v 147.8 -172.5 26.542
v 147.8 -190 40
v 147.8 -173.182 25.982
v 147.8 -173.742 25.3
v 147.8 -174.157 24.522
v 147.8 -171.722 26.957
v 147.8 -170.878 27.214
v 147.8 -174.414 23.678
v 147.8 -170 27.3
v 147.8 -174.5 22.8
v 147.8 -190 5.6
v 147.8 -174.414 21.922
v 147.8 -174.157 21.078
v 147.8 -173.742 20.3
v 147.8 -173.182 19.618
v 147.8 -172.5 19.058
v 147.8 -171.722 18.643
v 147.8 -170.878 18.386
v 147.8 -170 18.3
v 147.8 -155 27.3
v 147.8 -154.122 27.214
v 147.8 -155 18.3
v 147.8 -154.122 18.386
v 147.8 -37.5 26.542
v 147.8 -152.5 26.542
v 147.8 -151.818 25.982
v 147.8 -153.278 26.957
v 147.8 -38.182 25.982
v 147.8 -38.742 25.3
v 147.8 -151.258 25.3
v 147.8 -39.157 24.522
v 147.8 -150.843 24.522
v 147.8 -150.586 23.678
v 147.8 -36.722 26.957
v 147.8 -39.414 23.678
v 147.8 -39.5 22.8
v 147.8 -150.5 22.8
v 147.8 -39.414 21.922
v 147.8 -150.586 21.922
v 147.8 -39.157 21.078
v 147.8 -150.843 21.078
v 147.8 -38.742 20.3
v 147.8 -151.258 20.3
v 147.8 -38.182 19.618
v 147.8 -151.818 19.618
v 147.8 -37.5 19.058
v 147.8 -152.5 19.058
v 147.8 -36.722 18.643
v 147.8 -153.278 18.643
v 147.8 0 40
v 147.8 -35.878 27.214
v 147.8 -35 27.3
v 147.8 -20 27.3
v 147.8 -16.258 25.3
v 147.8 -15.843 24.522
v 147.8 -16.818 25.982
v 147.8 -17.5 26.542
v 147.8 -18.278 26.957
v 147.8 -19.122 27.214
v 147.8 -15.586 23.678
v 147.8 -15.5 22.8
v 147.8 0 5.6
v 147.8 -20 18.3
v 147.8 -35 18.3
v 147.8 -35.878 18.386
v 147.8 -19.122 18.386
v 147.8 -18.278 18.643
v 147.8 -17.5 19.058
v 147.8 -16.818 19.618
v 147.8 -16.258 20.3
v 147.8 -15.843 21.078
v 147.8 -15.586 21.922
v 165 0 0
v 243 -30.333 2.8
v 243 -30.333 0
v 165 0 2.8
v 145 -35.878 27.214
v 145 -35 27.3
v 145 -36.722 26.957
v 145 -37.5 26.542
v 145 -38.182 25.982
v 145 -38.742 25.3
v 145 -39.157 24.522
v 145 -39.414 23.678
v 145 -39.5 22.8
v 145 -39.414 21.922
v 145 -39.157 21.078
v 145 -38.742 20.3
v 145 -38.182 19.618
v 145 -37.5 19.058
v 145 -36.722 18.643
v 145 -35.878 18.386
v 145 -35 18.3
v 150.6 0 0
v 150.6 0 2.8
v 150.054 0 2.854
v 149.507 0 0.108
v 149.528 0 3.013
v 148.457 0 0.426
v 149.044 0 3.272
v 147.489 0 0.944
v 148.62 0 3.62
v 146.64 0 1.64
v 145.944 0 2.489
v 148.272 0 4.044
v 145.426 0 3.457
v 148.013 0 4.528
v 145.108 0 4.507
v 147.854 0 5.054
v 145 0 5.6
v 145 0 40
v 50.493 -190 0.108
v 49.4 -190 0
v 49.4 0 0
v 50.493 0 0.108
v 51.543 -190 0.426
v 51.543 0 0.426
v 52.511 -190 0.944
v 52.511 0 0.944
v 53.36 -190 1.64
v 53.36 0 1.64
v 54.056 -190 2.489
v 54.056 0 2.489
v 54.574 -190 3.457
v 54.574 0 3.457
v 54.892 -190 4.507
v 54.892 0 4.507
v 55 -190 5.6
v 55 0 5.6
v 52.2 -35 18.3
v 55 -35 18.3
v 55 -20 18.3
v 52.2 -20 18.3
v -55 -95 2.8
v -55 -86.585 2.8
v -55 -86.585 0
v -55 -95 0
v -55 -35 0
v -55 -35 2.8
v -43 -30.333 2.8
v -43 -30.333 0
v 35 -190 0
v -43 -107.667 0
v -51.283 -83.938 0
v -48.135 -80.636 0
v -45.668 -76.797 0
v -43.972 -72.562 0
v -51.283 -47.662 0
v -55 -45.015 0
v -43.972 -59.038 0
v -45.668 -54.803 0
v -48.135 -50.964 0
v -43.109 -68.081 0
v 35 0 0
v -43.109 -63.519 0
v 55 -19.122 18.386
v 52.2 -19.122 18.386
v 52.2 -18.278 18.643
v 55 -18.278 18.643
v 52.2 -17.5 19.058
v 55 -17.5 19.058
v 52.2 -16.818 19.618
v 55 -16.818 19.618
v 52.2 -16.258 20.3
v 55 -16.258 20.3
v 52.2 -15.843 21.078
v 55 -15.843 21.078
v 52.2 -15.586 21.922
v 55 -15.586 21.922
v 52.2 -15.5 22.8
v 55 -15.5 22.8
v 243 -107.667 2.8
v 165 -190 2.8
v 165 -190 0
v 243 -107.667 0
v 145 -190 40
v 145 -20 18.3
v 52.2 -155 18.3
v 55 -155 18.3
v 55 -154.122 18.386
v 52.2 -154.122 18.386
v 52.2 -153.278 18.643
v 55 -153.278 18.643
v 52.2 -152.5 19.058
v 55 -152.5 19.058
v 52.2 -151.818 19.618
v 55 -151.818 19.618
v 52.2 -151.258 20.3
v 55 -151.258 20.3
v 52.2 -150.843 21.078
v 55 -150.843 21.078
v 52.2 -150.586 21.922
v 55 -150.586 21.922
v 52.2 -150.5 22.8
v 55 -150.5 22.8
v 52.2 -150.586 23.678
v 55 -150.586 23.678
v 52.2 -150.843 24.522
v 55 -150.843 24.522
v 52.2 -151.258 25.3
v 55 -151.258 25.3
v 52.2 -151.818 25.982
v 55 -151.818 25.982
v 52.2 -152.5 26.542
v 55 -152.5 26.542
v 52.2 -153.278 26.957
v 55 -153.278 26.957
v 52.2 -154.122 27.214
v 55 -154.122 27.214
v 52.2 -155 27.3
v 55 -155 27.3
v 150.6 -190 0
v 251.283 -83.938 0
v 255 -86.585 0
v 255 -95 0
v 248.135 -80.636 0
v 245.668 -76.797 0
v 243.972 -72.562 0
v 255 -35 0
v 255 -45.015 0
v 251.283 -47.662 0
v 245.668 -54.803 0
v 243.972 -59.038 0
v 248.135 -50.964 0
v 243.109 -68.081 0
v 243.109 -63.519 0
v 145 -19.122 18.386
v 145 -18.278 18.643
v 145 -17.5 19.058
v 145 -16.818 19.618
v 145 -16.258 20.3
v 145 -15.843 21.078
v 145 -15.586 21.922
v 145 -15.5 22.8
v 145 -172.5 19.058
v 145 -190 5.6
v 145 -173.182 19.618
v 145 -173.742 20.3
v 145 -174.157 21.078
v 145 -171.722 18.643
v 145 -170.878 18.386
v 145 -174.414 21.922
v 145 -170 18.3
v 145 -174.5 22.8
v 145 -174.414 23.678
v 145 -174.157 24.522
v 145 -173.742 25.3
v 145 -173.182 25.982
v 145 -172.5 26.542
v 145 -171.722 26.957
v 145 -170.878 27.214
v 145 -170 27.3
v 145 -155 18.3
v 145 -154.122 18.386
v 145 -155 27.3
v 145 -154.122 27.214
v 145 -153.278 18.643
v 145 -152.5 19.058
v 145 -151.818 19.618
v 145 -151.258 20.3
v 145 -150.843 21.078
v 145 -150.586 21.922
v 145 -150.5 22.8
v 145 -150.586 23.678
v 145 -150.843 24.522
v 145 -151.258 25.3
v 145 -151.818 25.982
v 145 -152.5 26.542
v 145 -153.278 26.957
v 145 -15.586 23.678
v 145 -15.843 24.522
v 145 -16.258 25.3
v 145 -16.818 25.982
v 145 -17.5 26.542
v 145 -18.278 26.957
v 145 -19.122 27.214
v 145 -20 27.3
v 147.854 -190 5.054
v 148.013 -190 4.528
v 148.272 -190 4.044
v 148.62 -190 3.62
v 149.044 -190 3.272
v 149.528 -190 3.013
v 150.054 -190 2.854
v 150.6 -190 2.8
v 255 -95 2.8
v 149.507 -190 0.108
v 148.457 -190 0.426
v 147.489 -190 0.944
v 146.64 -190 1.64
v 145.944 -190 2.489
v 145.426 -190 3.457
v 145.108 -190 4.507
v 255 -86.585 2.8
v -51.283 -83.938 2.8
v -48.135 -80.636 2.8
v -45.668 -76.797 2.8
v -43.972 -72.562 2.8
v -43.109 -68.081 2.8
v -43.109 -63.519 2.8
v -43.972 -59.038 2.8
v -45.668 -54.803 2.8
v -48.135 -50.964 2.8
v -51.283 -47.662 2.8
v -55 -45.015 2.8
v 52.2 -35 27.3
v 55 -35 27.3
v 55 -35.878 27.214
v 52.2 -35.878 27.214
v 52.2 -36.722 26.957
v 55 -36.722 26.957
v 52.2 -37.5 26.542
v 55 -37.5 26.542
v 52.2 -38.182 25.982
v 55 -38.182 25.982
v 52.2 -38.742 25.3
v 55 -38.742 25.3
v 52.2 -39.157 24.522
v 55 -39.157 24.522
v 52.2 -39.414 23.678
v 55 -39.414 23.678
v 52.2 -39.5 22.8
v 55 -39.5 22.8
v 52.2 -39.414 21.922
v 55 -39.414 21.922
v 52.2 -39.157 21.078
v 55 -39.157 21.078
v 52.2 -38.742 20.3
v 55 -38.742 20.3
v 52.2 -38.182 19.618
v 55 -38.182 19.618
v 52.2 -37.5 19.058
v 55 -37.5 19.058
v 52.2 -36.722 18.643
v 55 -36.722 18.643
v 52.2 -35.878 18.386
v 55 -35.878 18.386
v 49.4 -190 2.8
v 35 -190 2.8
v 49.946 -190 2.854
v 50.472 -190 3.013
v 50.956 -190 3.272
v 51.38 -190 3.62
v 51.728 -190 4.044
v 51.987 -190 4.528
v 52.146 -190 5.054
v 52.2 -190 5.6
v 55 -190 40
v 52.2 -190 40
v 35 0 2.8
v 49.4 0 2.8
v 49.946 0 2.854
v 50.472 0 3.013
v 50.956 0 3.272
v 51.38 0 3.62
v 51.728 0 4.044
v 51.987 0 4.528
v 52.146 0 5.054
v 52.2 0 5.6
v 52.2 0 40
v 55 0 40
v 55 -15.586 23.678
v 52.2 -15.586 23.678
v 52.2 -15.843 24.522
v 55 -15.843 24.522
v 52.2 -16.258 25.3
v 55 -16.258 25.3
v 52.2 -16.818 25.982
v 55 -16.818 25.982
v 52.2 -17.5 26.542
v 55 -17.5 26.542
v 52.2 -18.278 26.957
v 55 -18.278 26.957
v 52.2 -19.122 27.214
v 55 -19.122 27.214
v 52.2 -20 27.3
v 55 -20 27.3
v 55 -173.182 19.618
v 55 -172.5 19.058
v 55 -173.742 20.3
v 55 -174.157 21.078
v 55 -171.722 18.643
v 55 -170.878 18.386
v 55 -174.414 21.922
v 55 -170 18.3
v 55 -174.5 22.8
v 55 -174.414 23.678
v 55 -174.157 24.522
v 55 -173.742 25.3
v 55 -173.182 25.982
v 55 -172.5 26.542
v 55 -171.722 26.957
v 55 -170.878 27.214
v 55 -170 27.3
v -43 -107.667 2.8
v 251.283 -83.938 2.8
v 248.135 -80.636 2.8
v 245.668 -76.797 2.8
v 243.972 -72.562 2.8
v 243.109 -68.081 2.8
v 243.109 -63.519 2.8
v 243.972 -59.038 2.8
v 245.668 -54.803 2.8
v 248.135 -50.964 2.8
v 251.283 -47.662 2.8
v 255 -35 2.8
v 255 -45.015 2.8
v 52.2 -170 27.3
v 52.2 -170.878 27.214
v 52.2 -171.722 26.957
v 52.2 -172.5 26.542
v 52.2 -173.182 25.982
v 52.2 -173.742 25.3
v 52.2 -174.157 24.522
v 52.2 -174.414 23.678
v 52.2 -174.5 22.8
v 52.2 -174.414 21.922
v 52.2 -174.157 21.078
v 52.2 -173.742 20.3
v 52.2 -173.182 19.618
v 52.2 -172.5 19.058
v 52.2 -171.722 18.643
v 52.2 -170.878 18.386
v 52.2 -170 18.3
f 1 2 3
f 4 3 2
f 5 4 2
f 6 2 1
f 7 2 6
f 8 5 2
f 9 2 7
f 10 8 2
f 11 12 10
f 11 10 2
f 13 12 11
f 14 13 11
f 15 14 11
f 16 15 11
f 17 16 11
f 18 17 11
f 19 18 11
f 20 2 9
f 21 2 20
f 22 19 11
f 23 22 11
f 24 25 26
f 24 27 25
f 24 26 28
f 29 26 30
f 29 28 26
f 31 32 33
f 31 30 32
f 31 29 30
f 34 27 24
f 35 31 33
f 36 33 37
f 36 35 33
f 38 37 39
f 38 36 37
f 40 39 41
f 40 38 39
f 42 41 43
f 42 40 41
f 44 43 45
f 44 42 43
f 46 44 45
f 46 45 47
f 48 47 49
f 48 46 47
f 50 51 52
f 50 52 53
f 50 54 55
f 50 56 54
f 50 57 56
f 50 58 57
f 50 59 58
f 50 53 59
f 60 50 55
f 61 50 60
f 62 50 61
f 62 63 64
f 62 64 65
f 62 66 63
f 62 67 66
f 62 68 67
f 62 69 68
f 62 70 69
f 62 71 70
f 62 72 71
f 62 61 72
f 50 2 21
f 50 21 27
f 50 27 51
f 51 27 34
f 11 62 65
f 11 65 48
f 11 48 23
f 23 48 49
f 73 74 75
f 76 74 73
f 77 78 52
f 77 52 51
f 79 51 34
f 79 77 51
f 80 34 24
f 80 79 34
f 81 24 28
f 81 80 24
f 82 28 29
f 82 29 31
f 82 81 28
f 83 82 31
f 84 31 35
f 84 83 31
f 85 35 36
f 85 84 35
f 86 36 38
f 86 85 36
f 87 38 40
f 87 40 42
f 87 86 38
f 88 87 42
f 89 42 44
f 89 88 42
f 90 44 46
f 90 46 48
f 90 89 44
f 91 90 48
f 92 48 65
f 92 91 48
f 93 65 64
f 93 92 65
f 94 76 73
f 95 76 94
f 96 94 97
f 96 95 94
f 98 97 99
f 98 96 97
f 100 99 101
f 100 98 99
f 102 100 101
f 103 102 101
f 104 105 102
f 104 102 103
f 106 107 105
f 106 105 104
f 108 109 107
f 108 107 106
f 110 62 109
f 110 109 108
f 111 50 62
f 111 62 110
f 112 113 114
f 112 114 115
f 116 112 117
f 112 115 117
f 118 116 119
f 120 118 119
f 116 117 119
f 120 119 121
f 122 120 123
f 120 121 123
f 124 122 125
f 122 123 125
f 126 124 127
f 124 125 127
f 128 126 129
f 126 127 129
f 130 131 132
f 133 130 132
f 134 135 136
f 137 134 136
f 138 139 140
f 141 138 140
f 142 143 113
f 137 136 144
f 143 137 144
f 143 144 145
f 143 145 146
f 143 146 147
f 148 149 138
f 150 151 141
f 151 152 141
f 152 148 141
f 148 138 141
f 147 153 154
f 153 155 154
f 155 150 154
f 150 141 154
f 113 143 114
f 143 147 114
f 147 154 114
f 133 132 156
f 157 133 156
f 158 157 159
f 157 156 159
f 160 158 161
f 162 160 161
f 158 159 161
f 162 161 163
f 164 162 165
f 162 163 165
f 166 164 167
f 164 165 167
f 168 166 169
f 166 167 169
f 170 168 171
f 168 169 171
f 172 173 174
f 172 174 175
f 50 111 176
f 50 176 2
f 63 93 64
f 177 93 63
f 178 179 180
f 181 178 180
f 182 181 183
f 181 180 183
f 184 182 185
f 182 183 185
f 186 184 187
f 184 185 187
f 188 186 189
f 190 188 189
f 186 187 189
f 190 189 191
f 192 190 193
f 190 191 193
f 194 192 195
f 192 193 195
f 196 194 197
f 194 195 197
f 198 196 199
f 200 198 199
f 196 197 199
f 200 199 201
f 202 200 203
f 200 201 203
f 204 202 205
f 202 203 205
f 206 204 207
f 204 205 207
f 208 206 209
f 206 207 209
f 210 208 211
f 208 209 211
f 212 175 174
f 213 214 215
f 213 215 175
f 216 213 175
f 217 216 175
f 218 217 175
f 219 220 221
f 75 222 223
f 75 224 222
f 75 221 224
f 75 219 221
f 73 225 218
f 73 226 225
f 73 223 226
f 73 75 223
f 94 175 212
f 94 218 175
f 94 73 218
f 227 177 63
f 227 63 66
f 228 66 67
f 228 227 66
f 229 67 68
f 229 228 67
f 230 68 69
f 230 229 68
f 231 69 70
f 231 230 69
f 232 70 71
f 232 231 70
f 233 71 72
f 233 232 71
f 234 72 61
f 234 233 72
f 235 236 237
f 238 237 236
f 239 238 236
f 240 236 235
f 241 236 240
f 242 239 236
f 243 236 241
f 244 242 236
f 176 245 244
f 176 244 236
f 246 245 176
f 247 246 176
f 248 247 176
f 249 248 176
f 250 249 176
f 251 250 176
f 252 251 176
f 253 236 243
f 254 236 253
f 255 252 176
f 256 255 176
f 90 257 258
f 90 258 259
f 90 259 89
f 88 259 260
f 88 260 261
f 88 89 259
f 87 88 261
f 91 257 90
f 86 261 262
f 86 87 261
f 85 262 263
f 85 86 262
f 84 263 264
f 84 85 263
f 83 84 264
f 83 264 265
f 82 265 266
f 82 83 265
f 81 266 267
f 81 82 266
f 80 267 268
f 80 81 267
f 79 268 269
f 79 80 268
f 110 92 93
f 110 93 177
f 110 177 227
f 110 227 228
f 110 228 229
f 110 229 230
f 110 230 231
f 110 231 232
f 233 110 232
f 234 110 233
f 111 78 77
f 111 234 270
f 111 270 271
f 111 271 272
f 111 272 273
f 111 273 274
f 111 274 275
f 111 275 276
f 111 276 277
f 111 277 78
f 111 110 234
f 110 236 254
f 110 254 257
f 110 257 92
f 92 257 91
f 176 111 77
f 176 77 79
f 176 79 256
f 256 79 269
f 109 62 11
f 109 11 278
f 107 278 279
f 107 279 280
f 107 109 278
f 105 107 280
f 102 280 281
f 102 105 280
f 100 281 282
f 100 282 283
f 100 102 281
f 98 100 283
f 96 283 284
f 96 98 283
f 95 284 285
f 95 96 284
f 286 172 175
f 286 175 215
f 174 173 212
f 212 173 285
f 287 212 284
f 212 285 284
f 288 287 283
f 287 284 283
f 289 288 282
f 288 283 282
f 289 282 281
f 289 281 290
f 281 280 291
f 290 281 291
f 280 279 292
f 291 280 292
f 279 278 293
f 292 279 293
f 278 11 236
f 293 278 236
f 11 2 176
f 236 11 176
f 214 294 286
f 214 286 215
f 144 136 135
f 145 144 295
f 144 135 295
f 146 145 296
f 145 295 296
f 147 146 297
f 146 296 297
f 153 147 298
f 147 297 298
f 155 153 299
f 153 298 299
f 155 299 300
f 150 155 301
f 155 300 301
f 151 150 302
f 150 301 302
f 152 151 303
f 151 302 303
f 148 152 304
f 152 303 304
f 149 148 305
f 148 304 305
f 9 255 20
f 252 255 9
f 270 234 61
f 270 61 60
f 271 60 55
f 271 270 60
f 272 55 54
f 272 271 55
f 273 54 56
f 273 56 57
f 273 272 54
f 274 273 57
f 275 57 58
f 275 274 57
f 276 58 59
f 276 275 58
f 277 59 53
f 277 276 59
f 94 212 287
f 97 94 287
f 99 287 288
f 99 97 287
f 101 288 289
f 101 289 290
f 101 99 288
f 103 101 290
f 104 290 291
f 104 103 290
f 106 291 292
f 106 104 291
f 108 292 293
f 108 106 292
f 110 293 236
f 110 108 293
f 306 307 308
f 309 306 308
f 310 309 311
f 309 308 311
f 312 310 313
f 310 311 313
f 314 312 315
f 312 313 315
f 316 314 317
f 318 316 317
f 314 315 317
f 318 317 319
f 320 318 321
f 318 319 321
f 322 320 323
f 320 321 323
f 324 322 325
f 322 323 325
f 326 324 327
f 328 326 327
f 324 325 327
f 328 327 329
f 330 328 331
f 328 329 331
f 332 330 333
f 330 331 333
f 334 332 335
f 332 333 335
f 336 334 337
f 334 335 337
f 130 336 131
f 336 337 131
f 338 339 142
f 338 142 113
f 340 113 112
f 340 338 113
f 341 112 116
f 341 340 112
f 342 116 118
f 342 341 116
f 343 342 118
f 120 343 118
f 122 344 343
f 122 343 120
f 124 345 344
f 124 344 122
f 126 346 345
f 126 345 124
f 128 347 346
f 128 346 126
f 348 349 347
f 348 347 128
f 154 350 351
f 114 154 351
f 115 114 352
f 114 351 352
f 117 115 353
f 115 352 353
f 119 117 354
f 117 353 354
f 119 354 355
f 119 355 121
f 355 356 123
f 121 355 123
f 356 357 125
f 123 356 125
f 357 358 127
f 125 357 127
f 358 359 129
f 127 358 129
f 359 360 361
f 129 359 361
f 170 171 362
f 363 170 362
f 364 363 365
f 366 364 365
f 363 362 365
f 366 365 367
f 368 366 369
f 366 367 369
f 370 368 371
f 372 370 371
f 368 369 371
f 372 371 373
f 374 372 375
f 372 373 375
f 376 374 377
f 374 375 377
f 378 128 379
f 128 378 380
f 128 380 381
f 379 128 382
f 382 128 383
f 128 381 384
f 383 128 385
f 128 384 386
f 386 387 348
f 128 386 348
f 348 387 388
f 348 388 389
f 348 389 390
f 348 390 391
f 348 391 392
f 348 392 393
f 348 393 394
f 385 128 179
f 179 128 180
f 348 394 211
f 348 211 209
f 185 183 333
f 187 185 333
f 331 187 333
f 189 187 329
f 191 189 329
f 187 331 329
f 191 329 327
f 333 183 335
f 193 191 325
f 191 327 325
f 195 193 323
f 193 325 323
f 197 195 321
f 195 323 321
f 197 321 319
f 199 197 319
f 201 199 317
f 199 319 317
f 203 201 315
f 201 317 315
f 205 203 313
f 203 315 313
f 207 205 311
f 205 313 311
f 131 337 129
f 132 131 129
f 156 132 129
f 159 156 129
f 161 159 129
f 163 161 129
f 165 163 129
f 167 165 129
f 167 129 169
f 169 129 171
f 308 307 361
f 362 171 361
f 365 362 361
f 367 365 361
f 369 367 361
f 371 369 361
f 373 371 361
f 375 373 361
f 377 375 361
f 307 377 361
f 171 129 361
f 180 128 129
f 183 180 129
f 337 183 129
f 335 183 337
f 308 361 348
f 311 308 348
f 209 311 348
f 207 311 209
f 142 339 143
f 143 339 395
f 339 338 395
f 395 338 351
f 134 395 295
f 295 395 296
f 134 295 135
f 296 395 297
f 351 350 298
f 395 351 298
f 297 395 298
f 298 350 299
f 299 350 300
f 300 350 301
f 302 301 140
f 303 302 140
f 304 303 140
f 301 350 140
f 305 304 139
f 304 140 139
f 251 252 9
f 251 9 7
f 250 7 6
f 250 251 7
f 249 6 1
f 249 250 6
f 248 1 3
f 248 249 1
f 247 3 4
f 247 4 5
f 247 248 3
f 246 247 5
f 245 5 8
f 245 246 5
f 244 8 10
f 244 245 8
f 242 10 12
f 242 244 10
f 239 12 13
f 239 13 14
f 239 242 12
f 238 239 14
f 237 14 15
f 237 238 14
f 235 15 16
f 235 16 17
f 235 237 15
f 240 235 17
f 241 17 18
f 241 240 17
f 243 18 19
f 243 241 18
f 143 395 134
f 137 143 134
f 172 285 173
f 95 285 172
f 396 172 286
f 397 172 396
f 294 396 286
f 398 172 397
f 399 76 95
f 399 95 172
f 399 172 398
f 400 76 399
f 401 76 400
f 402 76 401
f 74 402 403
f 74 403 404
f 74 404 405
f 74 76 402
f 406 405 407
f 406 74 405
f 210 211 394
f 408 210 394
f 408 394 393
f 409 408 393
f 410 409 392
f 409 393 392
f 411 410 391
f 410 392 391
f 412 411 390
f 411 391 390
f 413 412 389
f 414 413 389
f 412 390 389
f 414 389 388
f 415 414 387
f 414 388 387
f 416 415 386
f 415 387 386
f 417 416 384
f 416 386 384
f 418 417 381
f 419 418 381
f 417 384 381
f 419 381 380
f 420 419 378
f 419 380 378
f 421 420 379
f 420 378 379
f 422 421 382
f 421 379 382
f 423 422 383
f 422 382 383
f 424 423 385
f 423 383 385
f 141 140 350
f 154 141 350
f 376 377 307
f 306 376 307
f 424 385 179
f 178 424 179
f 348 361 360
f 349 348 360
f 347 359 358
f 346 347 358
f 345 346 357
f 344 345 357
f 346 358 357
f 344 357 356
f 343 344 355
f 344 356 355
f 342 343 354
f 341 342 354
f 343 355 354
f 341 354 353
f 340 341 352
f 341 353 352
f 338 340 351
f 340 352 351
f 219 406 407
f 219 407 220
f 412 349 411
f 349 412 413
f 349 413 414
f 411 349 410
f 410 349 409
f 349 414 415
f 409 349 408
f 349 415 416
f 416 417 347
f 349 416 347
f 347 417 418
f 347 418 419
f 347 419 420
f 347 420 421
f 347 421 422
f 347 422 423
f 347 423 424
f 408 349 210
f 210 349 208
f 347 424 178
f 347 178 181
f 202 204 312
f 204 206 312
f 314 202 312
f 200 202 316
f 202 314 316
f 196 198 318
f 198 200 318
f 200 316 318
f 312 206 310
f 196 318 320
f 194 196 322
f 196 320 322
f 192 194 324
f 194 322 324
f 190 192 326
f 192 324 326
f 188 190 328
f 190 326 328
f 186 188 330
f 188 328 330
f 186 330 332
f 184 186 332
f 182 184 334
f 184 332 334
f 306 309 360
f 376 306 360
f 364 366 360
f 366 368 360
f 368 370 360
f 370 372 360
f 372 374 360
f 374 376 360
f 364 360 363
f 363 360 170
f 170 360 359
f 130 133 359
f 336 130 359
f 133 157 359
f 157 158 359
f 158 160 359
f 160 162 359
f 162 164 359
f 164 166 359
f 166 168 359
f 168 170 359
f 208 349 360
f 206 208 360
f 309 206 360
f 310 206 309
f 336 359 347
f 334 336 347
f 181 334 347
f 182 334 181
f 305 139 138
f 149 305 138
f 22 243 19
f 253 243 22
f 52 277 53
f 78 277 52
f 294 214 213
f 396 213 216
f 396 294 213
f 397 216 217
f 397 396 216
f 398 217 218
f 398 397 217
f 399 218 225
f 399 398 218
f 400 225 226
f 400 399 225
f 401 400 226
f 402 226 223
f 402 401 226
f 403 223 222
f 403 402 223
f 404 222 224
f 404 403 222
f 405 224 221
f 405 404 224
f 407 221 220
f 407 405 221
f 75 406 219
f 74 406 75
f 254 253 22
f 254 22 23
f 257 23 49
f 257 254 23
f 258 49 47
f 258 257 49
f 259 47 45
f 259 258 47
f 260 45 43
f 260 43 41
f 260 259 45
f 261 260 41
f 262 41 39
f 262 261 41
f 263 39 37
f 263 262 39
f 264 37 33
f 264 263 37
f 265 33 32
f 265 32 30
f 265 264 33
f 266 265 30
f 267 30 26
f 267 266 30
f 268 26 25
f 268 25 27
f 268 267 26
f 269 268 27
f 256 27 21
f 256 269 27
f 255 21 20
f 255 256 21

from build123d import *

# Parameters (mm, degrees)
F1_DEPTH = 190
F2_R     = 24
F3_DEPTH = 3
F5_DEPTH = 3


with BuildPart() as f1:
    # F0 (on Front) → F1 (new body)
    with BuildSketch(Plane.XZ):
        with BuildLine():
            Line((-55, 0), (0, 0))
            Line((0, 0), (49.4, 0))
            ThreePointArc((49.4, 0), (53.359798, 1.640202), (55, 5.6))
            Line((55, 5.6), (55, 40))
            Line((55, 40), (52.2, 40))
            Line((52.2, 40), (52.2, 5.6))
            ThreePointArc((52.2, 5.6), (51.379899, 3.620101), (49.4, 2.8))
            Line((49.4, 2.8), (0, 2.8))
            Line((0, 2.8), (-55, 2.8))
            Line((-55, 2.8), (-55, 0))
        make_face()
    extrude(amount=F1_DEPTH)

    # F2 (on face) → F3 (cut)
    with BuildSketch(Plane.XY.offset(2.8)):
        Polygon((-43, 0), (-55, 0), (-55, -35), (-43, -30.333333), align=None)
        Polygon((35, -190), (-43, -107.666667), (-43, -190), align=None)
        Polygon((-43, -190), (-43, -107.666667), (-55, -95), (-55, -190), align=None)
        with Locations((-67, -65.8)):
            Circle(F2_R)
        Polygon((35, 0), (-43, 0), (-43, -30.333333), align=None)
    extrude(amount=-F3_DEPTH, mode=Mode.SUBTRACT)

    # F4 (on face) → F5 (cut)
    with BuildSketch(Plane.YZ.offset(55)):
        with BuildLine():
            Line((-35, 18.3), (-20, 18.3))
            ThreePointArc((-20, 18.3), (-16.818019, 19.618019), (-15.5, 22.8))
            ThreePointArc((-15.5, 22.8), (-16.818019, 25.981981), (-20, 27.3))
            Line((-20, 27.3), (-35, 27.3))
            ThreePointArc((-35, 27.3), (-39.5, 22.8), (-35, 18.3))
        make_face()
        with BuildLine():
            Line((-170, 18.3), (-155, 18.3))
            ThreePointArc((-155, 18.3), (-150.5, 22.8), (-155, 27.3))
            Line((-155, 27.3), (-170, 27.3))
            ThreePointArc((-170, 27.3), (-174.5, 22.8), (-170, 18.3))
        make_face()
    extrude(amount=-F5_DEPTH, mode=Mode.SUBTRACT)


with BuildPart() as f7_1:
    # F7: instance of F1
    add(f1.part.mirror(Plane.YZ.offset(100)))


solid = Compound([f1.part, f7_1.part])
